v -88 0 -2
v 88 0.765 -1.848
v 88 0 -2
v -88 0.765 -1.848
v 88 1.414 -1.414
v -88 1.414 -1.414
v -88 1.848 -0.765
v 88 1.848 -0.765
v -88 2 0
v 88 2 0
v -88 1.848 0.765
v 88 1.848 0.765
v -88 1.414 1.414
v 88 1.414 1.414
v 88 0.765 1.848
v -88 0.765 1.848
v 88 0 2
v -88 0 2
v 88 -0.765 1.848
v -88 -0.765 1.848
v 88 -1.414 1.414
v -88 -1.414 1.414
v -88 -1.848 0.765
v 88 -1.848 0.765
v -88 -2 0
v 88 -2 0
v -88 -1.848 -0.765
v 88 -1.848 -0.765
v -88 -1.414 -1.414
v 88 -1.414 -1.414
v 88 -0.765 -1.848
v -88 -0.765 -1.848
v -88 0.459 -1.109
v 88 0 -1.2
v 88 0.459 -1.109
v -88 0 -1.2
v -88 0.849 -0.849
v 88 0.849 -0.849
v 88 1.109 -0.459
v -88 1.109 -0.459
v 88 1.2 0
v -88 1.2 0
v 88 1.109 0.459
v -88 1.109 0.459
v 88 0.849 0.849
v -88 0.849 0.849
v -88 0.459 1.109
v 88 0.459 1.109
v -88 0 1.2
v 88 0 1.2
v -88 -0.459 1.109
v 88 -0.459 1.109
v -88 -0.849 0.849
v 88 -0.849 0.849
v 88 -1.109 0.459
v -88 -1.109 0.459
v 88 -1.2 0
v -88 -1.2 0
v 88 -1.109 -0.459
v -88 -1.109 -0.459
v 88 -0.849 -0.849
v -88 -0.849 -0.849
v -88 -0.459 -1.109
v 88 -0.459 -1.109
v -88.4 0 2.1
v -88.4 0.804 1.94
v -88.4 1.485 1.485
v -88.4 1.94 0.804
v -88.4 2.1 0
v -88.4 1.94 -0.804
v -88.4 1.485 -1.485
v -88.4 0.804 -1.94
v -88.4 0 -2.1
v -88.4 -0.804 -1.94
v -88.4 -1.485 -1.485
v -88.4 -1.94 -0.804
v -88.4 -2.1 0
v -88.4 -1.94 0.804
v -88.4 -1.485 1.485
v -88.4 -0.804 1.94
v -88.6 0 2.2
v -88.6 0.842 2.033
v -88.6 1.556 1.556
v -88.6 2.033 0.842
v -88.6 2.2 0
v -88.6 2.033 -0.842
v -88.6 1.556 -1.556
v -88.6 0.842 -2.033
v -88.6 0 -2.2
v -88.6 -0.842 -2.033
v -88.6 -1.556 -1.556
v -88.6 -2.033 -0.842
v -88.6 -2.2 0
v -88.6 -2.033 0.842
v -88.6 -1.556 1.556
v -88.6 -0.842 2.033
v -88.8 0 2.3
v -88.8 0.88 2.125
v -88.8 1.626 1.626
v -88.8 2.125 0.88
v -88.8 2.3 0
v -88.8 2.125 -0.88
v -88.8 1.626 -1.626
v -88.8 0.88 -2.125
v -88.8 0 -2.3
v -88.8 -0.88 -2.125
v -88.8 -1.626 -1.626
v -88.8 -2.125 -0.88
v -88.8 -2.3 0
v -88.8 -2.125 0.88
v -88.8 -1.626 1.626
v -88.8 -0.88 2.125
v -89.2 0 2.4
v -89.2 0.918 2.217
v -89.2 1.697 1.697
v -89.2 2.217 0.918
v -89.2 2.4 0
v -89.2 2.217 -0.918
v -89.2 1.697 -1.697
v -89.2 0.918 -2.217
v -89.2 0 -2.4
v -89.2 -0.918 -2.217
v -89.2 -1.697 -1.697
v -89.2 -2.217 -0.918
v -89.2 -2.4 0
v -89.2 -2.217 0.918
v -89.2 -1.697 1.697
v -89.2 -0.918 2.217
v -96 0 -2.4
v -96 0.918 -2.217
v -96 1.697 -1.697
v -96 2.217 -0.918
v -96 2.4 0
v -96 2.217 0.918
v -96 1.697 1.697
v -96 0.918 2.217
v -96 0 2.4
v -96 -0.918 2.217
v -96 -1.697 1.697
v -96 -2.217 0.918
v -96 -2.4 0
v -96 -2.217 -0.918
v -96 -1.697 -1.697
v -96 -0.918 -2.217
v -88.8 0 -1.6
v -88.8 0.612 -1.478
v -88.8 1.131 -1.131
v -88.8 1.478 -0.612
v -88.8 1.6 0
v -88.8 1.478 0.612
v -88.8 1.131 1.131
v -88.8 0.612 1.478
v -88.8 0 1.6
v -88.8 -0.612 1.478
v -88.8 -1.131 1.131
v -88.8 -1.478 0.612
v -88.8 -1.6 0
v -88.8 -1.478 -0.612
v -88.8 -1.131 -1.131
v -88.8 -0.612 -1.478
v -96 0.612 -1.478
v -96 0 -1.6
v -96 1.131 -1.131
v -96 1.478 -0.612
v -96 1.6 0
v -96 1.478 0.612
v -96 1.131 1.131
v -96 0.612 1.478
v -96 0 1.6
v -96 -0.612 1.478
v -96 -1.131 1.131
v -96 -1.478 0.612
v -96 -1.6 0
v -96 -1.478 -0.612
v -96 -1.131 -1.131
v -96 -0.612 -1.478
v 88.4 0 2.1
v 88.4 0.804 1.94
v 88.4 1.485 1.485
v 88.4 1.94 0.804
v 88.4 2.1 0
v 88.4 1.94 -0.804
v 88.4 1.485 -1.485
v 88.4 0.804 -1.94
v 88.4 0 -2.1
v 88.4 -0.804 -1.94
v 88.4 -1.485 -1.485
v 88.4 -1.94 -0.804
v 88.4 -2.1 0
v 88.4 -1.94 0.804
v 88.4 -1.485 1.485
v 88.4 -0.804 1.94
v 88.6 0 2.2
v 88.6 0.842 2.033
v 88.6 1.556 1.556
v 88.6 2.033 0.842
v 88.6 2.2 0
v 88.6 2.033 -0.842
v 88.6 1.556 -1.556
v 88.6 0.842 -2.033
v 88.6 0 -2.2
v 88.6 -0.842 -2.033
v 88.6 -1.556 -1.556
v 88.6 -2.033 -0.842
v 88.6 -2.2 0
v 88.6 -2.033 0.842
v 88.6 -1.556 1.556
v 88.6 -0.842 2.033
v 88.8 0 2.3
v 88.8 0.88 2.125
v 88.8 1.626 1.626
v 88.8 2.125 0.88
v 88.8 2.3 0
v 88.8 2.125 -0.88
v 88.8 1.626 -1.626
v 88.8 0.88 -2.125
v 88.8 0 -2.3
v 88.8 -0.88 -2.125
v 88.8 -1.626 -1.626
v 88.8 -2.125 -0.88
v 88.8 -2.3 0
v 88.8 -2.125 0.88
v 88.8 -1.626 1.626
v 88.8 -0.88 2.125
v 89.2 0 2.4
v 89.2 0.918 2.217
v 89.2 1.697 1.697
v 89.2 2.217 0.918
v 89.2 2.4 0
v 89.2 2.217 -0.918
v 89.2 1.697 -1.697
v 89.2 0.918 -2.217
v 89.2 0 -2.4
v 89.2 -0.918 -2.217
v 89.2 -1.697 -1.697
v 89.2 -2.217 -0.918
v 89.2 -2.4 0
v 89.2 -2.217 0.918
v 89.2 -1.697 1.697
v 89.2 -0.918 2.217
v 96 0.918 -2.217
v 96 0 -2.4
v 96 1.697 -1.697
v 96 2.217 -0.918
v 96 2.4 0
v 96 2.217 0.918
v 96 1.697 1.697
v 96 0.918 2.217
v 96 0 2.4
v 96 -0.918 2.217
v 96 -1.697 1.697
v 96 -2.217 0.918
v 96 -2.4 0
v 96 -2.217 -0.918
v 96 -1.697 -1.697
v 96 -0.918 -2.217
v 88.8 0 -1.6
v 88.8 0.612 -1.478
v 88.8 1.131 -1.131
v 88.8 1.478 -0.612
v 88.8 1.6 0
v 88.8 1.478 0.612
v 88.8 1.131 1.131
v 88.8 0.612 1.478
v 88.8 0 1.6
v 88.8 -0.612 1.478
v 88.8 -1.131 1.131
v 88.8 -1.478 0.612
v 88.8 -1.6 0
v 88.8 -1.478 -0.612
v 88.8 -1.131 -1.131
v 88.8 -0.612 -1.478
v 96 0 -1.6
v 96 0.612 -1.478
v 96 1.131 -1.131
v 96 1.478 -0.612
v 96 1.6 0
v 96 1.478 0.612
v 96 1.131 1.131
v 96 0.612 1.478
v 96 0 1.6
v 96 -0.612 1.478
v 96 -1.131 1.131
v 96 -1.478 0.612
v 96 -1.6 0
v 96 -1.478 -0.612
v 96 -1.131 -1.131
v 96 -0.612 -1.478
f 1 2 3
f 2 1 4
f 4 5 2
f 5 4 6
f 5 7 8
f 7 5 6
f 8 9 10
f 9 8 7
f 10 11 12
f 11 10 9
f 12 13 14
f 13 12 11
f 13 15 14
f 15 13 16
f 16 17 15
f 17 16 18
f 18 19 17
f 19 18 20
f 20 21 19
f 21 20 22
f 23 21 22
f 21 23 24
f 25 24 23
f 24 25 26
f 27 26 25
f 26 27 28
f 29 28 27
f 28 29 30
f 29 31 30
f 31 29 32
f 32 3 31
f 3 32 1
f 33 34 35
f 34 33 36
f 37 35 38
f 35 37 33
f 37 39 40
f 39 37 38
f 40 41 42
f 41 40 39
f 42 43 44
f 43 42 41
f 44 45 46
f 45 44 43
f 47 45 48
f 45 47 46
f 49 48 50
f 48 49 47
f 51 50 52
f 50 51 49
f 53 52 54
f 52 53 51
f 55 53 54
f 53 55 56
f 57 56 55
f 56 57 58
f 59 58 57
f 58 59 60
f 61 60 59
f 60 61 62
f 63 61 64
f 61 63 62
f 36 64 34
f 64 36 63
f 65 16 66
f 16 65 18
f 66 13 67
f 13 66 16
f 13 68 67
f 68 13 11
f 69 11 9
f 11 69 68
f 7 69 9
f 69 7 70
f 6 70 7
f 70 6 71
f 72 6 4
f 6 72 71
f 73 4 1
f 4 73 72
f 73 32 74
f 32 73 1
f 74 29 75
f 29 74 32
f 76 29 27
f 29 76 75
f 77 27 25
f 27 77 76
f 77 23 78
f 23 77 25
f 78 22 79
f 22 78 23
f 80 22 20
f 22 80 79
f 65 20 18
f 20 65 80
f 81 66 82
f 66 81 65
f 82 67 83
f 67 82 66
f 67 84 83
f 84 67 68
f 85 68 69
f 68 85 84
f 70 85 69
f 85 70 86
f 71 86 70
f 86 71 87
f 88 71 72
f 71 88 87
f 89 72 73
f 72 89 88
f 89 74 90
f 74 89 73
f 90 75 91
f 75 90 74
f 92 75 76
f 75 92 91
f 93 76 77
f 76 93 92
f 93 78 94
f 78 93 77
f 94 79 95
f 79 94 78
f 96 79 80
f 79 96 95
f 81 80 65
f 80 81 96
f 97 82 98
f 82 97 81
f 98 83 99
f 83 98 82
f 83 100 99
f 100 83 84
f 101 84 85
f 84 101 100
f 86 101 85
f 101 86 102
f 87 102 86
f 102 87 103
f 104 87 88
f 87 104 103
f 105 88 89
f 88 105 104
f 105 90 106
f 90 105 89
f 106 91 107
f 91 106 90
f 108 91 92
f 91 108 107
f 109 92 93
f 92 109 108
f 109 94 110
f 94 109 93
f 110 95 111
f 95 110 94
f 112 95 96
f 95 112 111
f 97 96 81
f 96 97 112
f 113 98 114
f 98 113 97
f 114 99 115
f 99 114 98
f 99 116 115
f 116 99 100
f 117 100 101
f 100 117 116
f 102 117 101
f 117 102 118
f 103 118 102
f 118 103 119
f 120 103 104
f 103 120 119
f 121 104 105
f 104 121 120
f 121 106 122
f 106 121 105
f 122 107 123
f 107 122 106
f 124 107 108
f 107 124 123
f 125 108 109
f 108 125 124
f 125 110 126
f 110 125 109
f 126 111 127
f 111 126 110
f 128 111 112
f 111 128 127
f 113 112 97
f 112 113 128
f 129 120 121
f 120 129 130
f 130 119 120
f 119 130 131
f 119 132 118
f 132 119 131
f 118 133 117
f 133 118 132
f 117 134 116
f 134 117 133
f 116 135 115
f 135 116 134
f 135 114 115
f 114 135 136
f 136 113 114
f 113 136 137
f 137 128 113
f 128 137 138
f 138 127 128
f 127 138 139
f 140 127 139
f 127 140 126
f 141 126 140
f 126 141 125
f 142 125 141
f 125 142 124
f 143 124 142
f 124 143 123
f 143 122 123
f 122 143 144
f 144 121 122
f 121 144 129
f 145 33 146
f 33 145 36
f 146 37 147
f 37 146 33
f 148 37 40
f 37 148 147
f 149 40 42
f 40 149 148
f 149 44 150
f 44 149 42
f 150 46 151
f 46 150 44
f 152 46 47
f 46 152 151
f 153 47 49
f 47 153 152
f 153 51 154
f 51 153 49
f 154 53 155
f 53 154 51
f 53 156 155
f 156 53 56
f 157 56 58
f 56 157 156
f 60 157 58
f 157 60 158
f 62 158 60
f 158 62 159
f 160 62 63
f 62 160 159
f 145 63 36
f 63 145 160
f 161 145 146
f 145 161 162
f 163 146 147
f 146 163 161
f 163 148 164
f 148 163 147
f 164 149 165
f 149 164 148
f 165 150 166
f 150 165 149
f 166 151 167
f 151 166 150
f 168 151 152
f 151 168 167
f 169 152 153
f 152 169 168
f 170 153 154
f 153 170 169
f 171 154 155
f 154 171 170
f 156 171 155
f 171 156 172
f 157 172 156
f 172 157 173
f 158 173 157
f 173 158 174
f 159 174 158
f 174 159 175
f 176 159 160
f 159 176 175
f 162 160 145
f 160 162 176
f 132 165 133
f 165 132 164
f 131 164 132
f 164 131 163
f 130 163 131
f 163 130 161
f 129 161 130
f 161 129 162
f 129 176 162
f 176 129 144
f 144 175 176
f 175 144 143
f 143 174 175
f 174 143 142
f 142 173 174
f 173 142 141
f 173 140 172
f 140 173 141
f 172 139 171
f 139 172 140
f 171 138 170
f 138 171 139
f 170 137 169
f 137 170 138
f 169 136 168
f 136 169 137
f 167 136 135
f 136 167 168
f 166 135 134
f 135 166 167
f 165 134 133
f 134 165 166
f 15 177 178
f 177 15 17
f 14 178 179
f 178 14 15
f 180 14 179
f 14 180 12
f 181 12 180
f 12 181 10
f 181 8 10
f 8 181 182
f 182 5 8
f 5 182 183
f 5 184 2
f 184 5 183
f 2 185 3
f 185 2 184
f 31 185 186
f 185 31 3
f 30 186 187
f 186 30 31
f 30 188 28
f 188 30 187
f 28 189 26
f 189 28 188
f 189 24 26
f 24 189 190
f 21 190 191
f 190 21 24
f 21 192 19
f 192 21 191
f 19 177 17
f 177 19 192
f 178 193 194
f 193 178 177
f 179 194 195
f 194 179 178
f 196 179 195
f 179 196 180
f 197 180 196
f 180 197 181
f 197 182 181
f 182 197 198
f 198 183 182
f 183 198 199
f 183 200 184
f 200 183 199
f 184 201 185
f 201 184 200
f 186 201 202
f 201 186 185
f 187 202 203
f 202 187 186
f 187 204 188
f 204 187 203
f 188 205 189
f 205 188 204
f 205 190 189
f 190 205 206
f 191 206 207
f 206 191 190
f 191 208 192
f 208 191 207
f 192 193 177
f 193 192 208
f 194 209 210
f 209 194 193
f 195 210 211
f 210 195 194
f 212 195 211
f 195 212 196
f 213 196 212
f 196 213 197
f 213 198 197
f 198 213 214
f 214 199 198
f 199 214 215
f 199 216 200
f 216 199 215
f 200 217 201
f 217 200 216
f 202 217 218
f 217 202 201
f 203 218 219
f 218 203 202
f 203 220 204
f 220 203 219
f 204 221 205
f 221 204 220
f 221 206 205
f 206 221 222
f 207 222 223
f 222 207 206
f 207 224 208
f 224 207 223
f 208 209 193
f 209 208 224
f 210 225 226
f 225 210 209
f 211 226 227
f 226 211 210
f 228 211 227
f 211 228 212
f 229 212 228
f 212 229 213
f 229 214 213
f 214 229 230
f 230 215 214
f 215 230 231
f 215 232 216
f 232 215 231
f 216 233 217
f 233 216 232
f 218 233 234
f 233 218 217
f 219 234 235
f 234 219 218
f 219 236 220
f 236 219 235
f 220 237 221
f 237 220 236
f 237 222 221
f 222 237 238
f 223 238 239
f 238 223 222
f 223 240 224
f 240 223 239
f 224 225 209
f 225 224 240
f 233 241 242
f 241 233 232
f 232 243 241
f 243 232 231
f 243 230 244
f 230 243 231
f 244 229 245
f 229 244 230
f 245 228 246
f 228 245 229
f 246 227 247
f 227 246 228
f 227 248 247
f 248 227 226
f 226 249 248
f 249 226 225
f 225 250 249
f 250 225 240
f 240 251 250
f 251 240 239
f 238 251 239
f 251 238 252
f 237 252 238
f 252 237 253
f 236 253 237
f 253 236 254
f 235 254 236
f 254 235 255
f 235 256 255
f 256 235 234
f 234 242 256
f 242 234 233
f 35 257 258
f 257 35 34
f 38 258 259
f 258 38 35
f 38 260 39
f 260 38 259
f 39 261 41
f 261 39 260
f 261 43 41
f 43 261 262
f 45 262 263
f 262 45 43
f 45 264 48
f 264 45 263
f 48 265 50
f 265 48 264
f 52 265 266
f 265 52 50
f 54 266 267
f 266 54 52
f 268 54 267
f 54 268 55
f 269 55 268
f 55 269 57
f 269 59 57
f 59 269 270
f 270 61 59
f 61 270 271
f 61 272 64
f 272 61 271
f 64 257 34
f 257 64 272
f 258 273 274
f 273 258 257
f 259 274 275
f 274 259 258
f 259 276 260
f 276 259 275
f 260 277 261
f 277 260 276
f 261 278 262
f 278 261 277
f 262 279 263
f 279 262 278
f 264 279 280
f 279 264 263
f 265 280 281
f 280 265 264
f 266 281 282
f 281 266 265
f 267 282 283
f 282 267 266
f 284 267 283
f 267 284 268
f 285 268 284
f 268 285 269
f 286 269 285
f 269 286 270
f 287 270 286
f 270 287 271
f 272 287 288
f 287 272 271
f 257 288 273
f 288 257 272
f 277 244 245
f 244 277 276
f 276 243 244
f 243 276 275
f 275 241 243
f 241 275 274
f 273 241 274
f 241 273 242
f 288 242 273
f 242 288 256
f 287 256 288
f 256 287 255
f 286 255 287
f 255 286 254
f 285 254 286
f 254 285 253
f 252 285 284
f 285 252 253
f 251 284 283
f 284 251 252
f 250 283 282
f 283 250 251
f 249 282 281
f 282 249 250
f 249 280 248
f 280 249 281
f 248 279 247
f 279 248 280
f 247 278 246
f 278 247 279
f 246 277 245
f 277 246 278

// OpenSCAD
use <../lib.scad>
use <71533k01.scad>
use <71533k03.scad>
function ldraw_lib__63540_f2() = [
// 0 Technic Pneumatic Tube 24L with End Bulges
// 0 Name: 63540-f2.dat
// 0 Author: Philippe Hurbain [Philo]
// 0 !LDRAW_ORG Part UPDATE 2026-08
// 0 !LICENSE Licensed under CC BY 4.0 : see CAreadme.txt
// 
// 0 BFC CERTIFY CCW
  [0,"BFC","CERTIFY"],
  [0,"BFC","CCW"],
// 
// 0 !CATEGORY Technic
// 0 !KEYWORDS 192 mm
// 
// 0 !HISTORY 2026-08-31 [OrionP] Official Update 2026-08
// 
// 1 16 -220 0 0 0 440 0 1 0 0 0 0 1 71533k03.dat
  [1,16,-220,0,0,0,440,0,1,0,0,0,0,1, ldraw_lib__71533k03()],
// 1 16 -220 0 0 0 -1 0 1 0 0 0 0 1 71533k01.dat
  [1,16,-220,0,0,0,-1,0,1,0,0,0,0,1, ldraw_lib__71533k01()],
// 1 16 220 0 0 0 1 0 1 0 0 0 0 1 71533k01.dat
  [1,16,220,0,0,0,1,0,1,0,0,0,0,1, ldraw_lib__71533k01()],
];
module ldraw_lib__63540_f2(step=0, col=false, unit=2/5, alt=false, line=0.2, solid=!$preview)
    makepoly(ldraw_lib__63540_f2(), step=step, col=col, unit=unit, alt=alt, line=line, solid=solid);
ldraw_lib__63540_f2(line=0.2);
